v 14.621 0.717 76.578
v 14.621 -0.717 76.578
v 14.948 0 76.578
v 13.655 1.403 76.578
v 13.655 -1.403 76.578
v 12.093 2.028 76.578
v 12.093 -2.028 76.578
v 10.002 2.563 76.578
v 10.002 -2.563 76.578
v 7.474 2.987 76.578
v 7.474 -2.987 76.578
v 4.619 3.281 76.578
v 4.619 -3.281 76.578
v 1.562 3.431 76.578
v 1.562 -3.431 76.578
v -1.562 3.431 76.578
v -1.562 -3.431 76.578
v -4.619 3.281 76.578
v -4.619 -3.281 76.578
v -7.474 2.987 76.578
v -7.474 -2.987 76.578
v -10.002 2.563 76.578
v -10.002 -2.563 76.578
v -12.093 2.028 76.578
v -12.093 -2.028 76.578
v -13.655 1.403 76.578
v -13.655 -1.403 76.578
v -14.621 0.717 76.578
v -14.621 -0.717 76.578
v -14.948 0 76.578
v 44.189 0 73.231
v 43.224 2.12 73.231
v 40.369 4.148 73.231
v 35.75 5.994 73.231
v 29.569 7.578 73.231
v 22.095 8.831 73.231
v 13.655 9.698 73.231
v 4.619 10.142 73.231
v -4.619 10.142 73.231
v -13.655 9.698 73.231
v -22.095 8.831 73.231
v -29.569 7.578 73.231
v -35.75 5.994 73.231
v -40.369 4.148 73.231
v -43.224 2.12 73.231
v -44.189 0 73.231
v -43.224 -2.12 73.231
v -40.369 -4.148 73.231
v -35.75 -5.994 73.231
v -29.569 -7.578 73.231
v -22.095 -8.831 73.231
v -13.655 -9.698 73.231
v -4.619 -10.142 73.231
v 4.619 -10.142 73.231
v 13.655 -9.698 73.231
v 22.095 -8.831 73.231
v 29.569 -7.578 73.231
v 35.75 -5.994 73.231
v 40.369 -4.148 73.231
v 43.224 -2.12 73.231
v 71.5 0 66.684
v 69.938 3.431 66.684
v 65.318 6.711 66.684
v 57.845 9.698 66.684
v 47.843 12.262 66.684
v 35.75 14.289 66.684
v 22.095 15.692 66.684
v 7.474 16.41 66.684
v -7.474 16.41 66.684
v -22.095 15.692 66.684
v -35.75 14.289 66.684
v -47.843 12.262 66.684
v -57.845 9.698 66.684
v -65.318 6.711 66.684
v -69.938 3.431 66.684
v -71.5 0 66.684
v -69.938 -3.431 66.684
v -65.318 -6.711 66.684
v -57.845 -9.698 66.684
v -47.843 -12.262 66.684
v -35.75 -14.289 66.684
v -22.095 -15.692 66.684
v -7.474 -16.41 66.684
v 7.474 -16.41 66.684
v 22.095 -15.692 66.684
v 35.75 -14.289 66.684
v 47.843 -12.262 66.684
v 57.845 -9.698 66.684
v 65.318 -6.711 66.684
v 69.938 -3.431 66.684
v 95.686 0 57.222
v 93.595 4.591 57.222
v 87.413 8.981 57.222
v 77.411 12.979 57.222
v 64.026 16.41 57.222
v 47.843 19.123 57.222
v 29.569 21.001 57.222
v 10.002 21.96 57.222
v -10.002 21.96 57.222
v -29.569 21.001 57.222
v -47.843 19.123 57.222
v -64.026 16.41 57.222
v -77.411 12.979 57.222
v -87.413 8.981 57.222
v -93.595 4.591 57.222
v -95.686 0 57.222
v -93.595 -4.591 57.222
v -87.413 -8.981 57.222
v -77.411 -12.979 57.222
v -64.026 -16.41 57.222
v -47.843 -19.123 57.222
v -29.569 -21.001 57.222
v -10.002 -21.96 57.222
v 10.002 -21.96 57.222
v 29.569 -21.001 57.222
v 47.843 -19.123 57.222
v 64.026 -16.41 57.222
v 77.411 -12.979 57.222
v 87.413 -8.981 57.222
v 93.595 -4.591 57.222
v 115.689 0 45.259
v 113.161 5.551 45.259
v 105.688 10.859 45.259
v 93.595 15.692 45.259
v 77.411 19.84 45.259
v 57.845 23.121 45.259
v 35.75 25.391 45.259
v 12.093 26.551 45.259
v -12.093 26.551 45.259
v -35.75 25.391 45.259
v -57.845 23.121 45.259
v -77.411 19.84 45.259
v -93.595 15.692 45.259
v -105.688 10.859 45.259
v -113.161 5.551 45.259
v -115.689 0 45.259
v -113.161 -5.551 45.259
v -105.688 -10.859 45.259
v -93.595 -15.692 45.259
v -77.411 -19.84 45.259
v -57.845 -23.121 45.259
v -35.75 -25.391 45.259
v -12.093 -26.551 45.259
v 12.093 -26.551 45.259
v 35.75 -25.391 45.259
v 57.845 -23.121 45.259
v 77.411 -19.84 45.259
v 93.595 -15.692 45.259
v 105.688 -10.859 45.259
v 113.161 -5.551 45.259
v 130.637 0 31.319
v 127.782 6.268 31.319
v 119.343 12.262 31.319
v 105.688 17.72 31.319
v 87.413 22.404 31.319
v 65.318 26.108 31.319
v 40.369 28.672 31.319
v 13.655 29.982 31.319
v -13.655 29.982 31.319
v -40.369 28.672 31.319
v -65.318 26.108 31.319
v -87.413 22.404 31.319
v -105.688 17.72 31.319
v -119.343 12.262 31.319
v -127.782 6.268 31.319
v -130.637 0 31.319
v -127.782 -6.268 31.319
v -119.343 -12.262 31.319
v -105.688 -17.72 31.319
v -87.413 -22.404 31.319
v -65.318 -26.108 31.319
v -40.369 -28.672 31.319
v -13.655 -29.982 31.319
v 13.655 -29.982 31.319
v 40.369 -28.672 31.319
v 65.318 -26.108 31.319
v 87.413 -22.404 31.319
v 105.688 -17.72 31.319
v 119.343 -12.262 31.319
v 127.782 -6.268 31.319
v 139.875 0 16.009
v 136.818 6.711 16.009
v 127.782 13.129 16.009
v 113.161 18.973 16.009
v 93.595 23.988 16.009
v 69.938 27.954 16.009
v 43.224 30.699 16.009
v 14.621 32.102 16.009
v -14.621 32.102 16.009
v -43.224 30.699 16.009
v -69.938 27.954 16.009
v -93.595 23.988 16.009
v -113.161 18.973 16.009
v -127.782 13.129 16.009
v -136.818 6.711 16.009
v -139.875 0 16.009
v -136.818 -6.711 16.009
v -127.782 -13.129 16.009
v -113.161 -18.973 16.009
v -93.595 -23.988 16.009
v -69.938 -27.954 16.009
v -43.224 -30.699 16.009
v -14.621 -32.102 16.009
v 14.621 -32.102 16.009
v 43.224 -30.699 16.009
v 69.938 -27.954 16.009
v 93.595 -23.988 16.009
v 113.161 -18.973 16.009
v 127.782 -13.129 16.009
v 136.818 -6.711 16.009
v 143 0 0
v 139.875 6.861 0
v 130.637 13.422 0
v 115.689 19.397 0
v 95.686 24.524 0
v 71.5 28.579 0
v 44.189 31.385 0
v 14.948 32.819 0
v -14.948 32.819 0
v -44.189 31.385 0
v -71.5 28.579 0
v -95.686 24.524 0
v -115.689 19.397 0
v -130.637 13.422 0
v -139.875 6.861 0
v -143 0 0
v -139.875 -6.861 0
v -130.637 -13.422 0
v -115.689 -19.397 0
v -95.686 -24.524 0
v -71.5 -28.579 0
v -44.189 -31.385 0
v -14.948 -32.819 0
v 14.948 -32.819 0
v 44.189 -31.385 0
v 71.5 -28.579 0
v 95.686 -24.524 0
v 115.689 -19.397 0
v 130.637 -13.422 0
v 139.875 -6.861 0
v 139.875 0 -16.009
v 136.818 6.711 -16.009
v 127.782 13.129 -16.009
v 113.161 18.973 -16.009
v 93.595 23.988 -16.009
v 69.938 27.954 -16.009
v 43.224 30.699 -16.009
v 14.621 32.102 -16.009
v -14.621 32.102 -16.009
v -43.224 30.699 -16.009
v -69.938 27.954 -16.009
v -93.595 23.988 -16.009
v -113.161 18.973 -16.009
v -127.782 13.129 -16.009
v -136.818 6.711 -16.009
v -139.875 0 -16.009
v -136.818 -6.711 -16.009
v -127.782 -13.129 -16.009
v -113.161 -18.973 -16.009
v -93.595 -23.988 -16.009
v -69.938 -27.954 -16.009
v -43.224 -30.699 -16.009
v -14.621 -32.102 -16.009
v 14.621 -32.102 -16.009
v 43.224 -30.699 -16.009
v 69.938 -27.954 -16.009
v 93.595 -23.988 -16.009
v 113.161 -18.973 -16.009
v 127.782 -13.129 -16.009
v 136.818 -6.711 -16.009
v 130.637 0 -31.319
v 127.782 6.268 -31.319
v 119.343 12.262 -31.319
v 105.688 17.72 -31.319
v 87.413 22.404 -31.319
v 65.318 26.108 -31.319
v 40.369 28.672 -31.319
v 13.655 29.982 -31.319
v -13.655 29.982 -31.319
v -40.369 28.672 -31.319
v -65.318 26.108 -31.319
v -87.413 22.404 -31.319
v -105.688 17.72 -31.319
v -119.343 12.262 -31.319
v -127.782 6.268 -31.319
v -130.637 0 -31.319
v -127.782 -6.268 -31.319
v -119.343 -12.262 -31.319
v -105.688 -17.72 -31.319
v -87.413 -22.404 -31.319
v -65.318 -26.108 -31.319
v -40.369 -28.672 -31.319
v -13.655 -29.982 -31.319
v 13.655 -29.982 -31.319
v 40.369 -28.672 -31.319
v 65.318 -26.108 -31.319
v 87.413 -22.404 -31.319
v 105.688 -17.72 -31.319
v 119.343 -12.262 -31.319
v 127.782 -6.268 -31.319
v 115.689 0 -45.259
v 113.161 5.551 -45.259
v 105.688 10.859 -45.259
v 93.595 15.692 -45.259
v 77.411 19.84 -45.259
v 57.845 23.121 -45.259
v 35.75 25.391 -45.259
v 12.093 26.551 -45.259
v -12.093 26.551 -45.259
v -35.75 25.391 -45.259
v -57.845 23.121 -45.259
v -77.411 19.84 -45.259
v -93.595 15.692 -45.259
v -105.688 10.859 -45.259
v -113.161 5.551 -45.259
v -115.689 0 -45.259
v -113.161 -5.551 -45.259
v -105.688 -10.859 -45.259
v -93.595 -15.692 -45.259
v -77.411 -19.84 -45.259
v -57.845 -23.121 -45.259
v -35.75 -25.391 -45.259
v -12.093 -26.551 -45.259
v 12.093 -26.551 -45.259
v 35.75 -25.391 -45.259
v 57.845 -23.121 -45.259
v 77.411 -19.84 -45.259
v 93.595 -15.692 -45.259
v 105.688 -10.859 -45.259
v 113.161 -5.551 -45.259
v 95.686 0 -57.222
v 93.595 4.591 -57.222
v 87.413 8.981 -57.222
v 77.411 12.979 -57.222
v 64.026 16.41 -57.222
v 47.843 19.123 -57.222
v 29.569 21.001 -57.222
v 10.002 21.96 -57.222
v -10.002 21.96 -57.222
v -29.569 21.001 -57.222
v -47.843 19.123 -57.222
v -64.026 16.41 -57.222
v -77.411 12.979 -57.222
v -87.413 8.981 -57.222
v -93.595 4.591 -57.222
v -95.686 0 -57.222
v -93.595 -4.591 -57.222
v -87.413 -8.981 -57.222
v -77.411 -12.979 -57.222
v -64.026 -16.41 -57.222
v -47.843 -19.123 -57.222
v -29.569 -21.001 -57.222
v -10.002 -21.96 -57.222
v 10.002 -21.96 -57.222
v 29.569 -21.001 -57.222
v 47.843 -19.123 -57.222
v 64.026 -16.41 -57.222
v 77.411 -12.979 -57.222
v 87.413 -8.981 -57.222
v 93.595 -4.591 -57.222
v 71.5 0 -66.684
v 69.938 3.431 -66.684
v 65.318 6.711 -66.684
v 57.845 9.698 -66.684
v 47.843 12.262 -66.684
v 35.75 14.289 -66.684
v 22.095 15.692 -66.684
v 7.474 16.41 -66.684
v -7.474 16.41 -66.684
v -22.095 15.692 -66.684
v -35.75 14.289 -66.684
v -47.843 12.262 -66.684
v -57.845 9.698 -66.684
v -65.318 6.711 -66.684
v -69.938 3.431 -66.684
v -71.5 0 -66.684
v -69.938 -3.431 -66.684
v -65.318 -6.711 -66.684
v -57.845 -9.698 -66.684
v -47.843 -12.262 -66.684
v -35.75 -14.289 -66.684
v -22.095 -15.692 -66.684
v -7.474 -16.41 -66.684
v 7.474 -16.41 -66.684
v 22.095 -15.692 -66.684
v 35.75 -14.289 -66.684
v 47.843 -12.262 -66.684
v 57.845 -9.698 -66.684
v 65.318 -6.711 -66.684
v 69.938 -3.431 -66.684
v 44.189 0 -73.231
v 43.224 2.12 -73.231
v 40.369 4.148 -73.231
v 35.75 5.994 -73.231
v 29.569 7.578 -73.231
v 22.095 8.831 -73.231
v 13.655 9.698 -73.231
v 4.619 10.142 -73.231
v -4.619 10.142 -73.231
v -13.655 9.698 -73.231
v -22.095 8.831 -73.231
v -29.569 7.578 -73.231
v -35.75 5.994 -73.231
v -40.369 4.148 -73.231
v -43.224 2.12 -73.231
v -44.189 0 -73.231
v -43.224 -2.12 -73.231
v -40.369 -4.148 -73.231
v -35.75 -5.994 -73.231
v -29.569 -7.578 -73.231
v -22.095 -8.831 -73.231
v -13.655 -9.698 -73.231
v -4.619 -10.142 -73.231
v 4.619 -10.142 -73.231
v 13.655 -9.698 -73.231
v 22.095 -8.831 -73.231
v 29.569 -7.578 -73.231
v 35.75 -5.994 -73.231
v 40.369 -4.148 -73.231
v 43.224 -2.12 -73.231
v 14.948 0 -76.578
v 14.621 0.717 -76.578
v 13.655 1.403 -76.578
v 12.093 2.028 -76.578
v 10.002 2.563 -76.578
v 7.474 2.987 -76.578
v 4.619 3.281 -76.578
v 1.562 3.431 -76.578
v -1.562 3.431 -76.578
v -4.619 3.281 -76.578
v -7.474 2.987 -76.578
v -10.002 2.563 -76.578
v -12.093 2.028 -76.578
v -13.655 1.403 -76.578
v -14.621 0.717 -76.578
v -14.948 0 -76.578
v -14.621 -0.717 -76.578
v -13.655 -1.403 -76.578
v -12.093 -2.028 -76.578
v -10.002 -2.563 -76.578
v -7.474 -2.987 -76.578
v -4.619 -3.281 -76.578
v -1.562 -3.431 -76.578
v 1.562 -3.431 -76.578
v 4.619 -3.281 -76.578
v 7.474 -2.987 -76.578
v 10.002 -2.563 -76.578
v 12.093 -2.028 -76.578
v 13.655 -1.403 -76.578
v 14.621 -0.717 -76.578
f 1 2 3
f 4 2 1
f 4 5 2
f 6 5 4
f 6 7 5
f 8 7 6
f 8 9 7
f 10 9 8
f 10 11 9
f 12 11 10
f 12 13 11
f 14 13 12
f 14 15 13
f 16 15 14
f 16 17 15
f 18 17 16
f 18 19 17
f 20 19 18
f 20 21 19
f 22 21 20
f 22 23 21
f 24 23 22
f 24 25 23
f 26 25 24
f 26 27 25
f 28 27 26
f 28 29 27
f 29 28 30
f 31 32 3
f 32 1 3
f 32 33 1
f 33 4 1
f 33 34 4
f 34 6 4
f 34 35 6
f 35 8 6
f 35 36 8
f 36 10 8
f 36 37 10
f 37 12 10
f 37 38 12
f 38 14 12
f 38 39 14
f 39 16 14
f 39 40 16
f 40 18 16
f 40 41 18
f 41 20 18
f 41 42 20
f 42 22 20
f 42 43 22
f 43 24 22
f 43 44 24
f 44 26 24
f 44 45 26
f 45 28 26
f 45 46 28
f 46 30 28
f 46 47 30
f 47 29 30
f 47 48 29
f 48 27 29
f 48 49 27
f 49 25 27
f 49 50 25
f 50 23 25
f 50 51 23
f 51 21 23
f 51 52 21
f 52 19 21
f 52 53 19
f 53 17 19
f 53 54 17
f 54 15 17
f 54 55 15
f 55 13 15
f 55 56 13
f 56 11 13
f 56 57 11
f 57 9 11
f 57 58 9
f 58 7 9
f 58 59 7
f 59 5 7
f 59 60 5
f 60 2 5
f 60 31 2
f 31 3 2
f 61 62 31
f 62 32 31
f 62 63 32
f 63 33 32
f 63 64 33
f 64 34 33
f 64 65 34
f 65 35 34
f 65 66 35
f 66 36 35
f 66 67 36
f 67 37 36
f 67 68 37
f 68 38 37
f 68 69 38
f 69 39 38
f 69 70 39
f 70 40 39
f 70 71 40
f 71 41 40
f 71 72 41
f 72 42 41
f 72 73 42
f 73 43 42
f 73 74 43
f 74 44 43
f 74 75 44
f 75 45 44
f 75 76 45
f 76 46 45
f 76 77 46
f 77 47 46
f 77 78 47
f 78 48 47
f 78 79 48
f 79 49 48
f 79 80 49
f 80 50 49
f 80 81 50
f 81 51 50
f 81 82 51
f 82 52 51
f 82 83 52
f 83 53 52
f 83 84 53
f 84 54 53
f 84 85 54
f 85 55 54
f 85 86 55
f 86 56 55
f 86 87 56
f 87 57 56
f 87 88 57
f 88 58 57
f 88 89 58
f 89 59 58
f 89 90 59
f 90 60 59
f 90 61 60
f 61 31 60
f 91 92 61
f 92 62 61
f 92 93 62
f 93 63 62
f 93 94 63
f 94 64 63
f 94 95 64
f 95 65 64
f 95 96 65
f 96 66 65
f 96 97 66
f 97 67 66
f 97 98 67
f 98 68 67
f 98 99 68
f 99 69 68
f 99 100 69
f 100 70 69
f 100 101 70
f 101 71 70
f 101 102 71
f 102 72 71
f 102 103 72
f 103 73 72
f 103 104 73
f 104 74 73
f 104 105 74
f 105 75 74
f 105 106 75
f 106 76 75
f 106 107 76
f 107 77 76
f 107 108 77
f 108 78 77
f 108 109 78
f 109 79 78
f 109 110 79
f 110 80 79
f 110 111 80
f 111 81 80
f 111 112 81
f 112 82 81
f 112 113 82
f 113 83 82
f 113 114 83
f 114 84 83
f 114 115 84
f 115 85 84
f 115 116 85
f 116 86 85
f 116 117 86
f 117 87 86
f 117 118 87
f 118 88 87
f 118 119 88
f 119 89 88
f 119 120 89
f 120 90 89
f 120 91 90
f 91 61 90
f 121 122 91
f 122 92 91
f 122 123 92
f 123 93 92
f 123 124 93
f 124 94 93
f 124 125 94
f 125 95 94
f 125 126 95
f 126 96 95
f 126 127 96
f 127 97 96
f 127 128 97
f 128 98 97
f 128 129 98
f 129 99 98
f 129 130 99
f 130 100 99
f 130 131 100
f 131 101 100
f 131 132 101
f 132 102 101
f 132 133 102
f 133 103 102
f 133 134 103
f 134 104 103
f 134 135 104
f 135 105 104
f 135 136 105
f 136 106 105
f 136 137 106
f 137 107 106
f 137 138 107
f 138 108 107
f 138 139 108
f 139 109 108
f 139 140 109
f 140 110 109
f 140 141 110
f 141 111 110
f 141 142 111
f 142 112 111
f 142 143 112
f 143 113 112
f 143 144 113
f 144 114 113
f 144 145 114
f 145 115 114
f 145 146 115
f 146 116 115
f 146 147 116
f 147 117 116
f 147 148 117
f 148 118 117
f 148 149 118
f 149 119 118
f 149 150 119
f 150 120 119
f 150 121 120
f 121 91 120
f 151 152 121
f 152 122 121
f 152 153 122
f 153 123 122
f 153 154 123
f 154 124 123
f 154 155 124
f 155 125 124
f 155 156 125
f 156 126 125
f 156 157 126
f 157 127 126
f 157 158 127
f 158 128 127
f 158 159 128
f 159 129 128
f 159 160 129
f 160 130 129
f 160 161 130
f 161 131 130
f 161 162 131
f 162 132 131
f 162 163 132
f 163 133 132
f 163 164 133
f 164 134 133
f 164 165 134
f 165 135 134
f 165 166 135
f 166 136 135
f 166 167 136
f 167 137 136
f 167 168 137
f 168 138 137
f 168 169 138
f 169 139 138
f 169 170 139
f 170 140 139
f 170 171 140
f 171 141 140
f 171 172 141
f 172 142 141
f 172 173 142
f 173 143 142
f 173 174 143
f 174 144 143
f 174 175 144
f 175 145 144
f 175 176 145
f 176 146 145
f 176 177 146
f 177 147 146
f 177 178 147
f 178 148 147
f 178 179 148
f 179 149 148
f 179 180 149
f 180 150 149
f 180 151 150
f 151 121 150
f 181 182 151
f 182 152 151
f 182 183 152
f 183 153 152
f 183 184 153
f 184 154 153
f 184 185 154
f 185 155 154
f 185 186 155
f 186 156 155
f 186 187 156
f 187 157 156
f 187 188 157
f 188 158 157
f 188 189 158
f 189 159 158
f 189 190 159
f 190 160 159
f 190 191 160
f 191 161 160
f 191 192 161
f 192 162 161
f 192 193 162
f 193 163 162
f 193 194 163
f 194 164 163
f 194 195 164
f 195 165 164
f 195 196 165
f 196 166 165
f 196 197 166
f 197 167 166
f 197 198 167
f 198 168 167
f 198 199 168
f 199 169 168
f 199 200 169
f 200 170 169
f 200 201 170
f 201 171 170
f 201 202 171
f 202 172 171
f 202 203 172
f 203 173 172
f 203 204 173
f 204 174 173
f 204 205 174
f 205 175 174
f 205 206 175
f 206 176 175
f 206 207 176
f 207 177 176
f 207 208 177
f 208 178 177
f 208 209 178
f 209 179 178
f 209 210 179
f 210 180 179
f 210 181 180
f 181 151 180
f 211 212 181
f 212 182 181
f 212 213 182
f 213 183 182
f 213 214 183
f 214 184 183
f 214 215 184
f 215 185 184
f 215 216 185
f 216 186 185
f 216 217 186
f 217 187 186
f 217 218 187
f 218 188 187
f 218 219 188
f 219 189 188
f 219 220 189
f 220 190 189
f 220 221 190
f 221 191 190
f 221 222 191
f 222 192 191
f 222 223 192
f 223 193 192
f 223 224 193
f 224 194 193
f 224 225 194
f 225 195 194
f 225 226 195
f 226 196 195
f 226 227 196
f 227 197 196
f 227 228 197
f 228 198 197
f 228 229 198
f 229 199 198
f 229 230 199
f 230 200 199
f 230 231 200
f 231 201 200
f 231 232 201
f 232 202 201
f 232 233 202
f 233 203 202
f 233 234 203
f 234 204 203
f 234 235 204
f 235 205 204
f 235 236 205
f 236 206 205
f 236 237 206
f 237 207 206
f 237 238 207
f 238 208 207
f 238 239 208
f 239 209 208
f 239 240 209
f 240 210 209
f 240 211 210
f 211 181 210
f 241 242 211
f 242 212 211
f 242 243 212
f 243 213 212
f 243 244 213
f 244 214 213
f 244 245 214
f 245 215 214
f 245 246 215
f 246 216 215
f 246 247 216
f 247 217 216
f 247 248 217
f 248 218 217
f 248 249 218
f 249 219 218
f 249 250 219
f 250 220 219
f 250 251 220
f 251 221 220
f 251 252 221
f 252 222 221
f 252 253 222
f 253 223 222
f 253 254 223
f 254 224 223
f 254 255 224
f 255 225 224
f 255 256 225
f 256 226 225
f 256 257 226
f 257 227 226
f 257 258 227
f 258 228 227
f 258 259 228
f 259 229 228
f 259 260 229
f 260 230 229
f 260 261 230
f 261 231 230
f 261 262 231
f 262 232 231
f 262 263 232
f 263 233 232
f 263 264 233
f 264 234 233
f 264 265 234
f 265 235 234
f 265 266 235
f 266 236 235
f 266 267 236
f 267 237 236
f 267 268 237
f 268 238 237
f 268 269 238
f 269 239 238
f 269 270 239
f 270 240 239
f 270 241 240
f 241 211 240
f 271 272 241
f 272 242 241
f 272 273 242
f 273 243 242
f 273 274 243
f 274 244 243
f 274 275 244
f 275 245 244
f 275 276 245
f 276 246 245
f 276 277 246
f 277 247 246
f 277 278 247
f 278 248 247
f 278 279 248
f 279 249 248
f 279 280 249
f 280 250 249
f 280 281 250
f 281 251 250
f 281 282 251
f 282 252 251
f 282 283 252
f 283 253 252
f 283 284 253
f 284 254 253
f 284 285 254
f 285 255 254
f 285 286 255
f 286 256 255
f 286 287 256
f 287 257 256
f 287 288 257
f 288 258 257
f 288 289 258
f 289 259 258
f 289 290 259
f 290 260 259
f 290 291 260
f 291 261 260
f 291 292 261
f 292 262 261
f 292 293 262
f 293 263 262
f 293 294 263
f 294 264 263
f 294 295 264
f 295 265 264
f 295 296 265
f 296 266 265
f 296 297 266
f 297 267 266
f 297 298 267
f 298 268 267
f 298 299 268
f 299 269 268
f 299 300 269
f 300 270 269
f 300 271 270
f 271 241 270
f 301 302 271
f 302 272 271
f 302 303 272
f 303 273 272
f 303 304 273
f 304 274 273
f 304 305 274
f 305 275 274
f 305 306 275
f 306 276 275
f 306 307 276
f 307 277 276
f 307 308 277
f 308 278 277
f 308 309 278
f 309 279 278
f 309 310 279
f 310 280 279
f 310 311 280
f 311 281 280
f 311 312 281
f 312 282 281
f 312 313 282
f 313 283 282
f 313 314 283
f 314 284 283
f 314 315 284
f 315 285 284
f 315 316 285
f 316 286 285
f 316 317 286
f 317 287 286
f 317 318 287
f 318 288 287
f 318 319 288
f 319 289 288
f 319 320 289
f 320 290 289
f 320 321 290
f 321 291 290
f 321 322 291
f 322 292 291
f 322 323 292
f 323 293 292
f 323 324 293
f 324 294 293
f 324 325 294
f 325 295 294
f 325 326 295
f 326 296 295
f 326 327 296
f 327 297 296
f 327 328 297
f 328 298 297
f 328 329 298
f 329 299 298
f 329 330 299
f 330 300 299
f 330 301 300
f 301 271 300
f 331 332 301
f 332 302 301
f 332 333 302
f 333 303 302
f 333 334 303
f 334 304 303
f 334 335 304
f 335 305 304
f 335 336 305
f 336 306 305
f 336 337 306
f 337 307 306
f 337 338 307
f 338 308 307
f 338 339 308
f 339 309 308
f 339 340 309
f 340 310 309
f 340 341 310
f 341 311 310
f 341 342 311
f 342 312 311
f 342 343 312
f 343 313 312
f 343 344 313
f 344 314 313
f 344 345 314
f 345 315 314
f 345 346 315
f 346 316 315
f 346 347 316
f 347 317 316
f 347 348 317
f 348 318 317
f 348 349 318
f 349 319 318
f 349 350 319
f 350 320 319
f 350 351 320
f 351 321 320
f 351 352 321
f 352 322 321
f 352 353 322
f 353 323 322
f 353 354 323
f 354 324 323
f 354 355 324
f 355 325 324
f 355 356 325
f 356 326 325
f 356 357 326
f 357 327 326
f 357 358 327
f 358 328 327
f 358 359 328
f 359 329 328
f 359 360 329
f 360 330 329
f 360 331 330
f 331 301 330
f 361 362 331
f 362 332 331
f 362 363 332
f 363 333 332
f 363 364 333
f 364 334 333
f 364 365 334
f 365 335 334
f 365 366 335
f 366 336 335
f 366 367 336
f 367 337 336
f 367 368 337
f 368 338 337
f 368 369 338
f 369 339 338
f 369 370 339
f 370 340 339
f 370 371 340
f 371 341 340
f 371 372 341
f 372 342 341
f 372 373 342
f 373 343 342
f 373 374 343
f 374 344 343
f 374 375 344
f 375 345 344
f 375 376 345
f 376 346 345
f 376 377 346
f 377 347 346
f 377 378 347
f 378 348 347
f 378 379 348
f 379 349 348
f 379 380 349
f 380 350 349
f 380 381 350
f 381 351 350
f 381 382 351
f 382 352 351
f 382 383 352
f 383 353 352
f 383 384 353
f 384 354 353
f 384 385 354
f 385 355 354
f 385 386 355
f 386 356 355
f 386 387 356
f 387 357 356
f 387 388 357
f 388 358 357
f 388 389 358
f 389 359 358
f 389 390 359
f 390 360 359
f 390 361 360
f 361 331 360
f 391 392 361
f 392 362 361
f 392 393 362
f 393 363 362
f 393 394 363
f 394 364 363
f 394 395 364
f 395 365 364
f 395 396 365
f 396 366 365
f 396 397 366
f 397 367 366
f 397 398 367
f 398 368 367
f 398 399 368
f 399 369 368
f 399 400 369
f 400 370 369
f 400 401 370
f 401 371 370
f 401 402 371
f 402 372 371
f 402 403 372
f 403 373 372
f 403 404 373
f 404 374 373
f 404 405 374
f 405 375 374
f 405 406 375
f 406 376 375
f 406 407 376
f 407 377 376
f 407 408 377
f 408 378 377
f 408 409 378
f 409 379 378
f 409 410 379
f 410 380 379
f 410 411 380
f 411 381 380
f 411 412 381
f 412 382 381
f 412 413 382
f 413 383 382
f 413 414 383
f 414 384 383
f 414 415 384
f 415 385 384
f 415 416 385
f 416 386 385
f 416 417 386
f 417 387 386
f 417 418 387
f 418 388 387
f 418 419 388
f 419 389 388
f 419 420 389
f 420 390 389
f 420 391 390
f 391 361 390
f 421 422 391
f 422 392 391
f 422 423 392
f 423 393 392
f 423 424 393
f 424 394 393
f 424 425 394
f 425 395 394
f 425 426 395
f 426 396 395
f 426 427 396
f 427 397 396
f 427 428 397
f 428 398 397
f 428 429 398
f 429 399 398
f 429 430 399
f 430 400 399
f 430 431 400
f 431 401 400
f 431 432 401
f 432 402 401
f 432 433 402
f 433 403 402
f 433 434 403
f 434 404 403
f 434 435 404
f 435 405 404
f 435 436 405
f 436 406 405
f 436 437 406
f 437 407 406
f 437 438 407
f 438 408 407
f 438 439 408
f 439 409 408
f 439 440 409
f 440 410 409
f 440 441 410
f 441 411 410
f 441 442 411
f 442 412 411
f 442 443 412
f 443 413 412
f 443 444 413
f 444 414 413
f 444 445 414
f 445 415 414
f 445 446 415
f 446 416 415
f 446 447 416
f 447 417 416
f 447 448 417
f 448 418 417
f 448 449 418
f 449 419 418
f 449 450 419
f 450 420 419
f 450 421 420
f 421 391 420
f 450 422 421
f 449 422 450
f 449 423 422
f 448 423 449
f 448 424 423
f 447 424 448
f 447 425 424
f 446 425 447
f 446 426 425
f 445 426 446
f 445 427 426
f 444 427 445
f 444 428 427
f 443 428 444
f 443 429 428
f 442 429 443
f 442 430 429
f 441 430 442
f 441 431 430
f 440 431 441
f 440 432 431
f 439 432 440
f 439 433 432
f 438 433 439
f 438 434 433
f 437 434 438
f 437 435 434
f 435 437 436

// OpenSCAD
// Generated by SolidPython 1.0.1 on 2020-07-29 00:46:50


scale(v = [13, 3, 7]) {
	sphere(r = 11);
}
/***********************************************
*********      SolidPython code:      **********
************************************************
 
# import packages: SolidPython
from solid import *
from solid.utils import *
from itertools import chain, combinations, permutations


class Resize:

    def __init__(self, scad_file):
        self.scad_file = scad_file
        #self.scad_file = import_scad(scad_file)
        # cone/cylinder param:
        self.r1 = 0
        self.r2 = 0
        self.h = 0
        # rectangular prism param:
        self.w = 0
        self.l = 0
        # ellipse param:
        self.r = 0

    # import OpenScad code (file name corresponds to shape)


    # classify shape + parameters
    def assign(self, param1, param2, param3):
        if self.scad_file == 'cone.scad':
            self.r1 = param1
            self.r2 = param2
            self.h = param3
        elif self.scad_file == 'cylinder.scad':
            self.r1 = param1
            self.r2 = param2
            self.h = param3
        elif self.scad_file == 'rectangularPrism.scad':
            self.h = param1
            self.l = param2
            self.w = param3
        else:
            self.r = param1
            self.h = param2

    # resize parameters
    def iterate(self):
        x = range(3, 20, 2)
        i = 1
        if self.scad_file == 'cone.scad':
            tempList = list(permutations(x, 2))
            for temp in tempList:
                param1 = temp[0]
                param2 = temp[1]
                filepath = 'produced_scad_files/' + 'cone' + str(param1) + '_' + str(param2) + '_' + '.scad'
                scad_render_to_file(cylinder(h=param1, r1=param2, r2=0), filepath)

        elif self.scad_file == 'cylinder.scad':
            tempList = list(permutations(x, 3))
            for temp in tempList:
                param1 = temp[0]
                param2 = temp[1]
                filepath = 'produced_scad_files/' + 'cylinder' + str(param1) + '_' + str(param2) + '_' + '.scad'
                scad_render_to_file(cylinder(h=param1, r1=param2, r2=param2), filepath)

        elif self.scad_file == 'rectangularPrism.scad':
            tempList = list(permutations(x, 3))
            for temp in tempList:
                param1 = temp[0]
                param2 = temp[1]
                param3 = temp[2]
                filepath = 'produced_scad_files/' + 'rectangularPrism' + str(param1) + '_' + str(param2) + '_' + str(
                    param3) + '.scad'
                scad_render_to_file(cube(size=(param1, param2, param3)), filepath)

        elif self.scad_file == 'ellipse.scad':
            tempList = list(permutations(x, 4))
            for temp in tempList:
                param1 = temp[0]
                param2 = temp[1]
                param3 = temp[2]
                param4 = temp[3]
                filepath = 'produced_scad_files/' + 'ellipse' + str(param1) + '_' + str(param2) + '_' + str(param3) + '_' + str(param4) + '.scad'
                scad_render_to_file(scale([param1, param2, param3])(sphere(r=param4)), filepath)

    def render_to_scadfile(self):
        scad_render_to_file(scad, 'example.scad') 
 
************************************************/
